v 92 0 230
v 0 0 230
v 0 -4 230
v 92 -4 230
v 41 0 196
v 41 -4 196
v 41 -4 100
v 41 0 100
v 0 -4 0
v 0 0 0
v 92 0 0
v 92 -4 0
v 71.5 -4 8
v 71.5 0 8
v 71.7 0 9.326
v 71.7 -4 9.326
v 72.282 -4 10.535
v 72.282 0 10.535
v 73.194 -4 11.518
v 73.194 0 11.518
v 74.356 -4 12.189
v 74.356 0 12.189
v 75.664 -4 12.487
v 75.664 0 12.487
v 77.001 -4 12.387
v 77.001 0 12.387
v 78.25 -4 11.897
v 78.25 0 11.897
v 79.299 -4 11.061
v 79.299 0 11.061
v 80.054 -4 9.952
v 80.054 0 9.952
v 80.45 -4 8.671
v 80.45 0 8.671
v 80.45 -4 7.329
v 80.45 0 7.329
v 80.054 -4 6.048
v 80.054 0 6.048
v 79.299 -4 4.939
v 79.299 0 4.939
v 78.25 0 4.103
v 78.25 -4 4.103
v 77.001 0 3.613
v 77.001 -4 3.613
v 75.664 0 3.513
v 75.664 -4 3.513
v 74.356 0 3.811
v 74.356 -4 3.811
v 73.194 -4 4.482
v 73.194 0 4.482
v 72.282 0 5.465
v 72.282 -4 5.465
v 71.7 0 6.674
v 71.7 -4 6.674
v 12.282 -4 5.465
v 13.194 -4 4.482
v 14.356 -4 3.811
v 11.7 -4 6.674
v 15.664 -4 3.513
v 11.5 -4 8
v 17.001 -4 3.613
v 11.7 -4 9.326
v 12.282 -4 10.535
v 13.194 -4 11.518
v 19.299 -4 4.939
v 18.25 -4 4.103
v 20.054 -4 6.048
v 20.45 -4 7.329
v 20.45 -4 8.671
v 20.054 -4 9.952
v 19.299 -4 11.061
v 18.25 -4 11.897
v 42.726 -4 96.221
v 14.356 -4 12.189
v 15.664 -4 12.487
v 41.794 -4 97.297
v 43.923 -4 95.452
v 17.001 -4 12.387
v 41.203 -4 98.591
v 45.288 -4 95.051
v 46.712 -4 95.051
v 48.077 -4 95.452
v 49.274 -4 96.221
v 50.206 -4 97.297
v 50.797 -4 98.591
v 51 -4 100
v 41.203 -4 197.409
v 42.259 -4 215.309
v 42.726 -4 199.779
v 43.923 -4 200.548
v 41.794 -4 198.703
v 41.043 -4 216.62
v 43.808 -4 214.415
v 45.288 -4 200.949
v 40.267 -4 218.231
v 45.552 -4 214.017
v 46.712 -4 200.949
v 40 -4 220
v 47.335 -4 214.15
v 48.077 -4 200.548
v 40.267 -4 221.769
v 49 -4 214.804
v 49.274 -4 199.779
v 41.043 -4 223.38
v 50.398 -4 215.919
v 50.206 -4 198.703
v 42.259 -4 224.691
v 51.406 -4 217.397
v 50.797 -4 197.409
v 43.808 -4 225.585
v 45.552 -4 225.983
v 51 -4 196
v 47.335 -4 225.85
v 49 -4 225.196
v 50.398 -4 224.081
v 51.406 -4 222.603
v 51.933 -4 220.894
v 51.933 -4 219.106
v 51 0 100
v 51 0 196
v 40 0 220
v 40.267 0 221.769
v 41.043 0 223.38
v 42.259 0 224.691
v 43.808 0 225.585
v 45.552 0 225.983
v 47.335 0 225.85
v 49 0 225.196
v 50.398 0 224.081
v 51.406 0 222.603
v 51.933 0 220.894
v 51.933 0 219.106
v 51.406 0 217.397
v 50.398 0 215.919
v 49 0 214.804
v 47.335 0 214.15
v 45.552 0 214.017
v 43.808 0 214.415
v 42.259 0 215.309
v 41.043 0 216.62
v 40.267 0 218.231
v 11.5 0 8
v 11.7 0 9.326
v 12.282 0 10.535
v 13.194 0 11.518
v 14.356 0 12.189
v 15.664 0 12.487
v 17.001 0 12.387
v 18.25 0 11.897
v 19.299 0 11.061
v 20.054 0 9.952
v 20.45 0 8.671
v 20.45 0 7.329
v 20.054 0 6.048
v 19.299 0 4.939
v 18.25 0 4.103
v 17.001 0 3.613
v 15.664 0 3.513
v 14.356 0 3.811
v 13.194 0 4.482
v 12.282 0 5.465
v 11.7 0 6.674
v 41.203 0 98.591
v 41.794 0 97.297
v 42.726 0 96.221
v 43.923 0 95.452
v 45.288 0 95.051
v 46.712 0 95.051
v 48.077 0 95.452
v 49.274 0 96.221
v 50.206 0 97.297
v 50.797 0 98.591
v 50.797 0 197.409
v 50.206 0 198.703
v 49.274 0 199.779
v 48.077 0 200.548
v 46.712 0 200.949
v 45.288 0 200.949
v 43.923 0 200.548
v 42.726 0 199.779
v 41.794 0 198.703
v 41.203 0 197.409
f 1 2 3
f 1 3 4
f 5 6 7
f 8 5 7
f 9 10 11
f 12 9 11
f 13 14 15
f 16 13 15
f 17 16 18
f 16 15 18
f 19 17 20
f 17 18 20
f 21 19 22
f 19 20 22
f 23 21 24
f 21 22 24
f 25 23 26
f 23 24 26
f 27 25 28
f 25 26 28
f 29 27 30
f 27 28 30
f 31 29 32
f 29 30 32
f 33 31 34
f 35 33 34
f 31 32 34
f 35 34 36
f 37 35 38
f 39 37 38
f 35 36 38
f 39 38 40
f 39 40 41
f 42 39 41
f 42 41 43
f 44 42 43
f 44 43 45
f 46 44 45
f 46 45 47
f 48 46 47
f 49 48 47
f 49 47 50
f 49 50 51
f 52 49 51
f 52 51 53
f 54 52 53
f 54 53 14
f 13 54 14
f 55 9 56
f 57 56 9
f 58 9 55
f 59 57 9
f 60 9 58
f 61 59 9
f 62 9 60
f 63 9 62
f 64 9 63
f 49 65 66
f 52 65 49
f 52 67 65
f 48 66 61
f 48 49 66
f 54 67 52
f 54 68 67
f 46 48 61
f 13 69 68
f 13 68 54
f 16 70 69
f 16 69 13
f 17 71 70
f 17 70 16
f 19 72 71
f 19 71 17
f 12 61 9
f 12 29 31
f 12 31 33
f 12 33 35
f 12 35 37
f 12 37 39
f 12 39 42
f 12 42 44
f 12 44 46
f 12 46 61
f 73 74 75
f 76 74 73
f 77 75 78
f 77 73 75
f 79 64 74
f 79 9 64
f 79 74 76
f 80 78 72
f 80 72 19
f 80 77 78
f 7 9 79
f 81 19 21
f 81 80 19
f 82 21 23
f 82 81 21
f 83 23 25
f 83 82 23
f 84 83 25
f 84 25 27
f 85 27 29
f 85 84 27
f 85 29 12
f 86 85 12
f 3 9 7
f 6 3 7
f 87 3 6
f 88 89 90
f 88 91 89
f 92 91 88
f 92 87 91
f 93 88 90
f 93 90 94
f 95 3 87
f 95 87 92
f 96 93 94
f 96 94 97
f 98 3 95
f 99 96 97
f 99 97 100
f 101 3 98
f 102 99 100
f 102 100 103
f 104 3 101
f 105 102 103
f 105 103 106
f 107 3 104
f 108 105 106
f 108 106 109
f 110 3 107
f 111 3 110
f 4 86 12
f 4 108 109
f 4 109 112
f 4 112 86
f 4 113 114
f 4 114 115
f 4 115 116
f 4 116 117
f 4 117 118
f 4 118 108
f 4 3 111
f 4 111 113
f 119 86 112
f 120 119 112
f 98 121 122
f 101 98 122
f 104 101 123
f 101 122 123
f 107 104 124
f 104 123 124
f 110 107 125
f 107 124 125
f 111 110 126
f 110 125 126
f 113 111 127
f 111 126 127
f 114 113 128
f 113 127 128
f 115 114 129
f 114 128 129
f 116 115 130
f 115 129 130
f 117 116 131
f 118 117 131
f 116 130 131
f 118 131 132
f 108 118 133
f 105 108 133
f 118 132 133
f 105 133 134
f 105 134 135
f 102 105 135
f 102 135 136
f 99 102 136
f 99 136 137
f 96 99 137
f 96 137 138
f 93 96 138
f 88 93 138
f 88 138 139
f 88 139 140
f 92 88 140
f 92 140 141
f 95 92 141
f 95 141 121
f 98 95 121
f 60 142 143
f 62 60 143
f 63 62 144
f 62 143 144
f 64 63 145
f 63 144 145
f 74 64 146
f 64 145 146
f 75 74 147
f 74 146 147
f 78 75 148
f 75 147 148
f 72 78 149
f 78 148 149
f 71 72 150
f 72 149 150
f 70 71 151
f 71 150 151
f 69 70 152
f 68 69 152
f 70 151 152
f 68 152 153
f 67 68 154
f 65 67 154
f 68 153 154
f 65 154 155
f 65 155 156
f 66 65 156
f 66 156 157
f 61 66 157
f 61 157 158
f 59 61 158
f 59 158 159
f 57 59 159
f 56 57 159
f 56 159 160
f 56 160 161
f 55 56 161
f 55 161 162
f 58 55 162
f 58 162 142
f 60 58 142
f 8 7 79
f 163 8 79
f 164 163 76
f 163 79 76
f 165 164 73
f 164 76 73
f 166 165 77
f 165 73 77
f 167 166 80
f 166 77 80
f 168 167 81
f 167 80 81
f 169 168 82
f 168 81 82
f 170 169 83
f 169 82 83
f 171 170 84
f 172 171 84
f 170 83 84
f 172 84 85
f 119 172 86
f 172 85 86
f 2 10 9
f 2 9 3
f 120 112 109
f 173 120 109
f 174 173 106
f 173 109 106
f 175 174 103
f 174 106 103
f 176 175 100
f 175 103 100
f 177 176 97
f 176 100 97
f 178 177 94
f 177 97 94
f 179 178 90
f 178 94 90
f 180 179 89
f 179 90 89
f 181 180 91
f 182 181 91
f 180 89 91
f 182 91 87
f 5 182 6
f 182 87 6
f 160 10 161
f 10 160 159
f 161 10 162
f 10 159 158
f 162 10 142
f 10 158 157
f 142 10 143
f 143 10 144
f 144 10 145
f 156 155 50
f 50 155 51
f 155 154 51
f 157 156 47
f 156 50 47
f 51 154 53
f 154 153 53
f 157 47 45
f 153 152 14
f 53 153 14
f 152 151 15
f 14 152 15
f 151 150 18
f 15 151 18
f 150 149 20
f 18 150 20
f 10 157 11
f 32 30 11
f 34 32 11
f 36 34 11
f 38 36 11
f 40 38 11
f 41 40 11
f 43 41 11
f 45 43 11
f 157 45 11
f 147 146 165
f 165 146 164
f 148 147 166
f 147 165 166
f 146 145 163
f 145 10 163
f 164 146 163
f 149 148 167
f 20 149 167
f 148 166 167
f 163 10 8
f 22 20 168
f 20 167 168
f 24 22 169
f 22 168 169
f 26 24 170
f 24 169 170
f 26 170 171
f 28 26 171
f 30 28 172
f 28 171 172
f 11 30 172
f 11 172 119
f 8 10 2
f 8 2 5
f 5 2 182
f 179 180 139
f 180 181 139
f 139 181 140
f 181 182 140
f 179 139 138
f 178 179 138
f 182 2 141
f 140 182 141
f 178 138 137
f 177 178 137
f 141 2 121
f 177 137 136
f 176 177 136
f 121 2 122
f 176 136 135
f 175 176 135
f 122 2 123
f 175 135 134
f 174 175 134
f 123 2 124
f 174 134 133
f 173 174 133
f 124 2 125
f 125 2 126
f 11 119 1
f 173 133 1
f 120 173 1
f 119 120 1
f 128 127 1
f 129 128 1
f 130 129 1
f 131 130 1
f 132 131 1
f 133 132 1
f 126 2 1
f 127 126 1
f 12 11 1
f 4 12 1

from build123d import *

# Parameters (mm, degrees)
F0_W     = 92
F0_H     = 230
F1_DEPTH = 4
F3_D     = 9
F4_D     = 12
F6_DEPTH = 4


with BuildPart() as f1:
    # F0 (on Front) → F1 (new body)
    with BuildSketch(Plane.XZ):
        with Locations((46, 115)):
            Rectangle(F0_W, F0_H)
    extrude(amount=F1_DEPTH)

    # F3 (through all)
    with Locations(Plane.XZ.offset(4)):
        with Locations((16, 8), (76, 8)):
            Hole(F3_D / 2)

    # F4 (through all)
    with Locations(Plane.XZ.offset(4)):
        with Locations((46, 220)):
            Hole(F4_D / 2)

    # F5 (on face) → F6 (cut, through all)
    with BuildSketch(Plane.XZ.offset(4)):
        with BuildLine():
            ThreePointArc((41, 100), (46, 95), (51, 100))
            Line((51, 100), (51, 196))
            ThreePointArc((51, 196), (46, 201), (41, 196))
            Line((41, 196), (41, 100))
        make_face()
    extrude(amount=-F6_DEPTH, mode=Mode.SUBTRACT)


solid = f1.part
